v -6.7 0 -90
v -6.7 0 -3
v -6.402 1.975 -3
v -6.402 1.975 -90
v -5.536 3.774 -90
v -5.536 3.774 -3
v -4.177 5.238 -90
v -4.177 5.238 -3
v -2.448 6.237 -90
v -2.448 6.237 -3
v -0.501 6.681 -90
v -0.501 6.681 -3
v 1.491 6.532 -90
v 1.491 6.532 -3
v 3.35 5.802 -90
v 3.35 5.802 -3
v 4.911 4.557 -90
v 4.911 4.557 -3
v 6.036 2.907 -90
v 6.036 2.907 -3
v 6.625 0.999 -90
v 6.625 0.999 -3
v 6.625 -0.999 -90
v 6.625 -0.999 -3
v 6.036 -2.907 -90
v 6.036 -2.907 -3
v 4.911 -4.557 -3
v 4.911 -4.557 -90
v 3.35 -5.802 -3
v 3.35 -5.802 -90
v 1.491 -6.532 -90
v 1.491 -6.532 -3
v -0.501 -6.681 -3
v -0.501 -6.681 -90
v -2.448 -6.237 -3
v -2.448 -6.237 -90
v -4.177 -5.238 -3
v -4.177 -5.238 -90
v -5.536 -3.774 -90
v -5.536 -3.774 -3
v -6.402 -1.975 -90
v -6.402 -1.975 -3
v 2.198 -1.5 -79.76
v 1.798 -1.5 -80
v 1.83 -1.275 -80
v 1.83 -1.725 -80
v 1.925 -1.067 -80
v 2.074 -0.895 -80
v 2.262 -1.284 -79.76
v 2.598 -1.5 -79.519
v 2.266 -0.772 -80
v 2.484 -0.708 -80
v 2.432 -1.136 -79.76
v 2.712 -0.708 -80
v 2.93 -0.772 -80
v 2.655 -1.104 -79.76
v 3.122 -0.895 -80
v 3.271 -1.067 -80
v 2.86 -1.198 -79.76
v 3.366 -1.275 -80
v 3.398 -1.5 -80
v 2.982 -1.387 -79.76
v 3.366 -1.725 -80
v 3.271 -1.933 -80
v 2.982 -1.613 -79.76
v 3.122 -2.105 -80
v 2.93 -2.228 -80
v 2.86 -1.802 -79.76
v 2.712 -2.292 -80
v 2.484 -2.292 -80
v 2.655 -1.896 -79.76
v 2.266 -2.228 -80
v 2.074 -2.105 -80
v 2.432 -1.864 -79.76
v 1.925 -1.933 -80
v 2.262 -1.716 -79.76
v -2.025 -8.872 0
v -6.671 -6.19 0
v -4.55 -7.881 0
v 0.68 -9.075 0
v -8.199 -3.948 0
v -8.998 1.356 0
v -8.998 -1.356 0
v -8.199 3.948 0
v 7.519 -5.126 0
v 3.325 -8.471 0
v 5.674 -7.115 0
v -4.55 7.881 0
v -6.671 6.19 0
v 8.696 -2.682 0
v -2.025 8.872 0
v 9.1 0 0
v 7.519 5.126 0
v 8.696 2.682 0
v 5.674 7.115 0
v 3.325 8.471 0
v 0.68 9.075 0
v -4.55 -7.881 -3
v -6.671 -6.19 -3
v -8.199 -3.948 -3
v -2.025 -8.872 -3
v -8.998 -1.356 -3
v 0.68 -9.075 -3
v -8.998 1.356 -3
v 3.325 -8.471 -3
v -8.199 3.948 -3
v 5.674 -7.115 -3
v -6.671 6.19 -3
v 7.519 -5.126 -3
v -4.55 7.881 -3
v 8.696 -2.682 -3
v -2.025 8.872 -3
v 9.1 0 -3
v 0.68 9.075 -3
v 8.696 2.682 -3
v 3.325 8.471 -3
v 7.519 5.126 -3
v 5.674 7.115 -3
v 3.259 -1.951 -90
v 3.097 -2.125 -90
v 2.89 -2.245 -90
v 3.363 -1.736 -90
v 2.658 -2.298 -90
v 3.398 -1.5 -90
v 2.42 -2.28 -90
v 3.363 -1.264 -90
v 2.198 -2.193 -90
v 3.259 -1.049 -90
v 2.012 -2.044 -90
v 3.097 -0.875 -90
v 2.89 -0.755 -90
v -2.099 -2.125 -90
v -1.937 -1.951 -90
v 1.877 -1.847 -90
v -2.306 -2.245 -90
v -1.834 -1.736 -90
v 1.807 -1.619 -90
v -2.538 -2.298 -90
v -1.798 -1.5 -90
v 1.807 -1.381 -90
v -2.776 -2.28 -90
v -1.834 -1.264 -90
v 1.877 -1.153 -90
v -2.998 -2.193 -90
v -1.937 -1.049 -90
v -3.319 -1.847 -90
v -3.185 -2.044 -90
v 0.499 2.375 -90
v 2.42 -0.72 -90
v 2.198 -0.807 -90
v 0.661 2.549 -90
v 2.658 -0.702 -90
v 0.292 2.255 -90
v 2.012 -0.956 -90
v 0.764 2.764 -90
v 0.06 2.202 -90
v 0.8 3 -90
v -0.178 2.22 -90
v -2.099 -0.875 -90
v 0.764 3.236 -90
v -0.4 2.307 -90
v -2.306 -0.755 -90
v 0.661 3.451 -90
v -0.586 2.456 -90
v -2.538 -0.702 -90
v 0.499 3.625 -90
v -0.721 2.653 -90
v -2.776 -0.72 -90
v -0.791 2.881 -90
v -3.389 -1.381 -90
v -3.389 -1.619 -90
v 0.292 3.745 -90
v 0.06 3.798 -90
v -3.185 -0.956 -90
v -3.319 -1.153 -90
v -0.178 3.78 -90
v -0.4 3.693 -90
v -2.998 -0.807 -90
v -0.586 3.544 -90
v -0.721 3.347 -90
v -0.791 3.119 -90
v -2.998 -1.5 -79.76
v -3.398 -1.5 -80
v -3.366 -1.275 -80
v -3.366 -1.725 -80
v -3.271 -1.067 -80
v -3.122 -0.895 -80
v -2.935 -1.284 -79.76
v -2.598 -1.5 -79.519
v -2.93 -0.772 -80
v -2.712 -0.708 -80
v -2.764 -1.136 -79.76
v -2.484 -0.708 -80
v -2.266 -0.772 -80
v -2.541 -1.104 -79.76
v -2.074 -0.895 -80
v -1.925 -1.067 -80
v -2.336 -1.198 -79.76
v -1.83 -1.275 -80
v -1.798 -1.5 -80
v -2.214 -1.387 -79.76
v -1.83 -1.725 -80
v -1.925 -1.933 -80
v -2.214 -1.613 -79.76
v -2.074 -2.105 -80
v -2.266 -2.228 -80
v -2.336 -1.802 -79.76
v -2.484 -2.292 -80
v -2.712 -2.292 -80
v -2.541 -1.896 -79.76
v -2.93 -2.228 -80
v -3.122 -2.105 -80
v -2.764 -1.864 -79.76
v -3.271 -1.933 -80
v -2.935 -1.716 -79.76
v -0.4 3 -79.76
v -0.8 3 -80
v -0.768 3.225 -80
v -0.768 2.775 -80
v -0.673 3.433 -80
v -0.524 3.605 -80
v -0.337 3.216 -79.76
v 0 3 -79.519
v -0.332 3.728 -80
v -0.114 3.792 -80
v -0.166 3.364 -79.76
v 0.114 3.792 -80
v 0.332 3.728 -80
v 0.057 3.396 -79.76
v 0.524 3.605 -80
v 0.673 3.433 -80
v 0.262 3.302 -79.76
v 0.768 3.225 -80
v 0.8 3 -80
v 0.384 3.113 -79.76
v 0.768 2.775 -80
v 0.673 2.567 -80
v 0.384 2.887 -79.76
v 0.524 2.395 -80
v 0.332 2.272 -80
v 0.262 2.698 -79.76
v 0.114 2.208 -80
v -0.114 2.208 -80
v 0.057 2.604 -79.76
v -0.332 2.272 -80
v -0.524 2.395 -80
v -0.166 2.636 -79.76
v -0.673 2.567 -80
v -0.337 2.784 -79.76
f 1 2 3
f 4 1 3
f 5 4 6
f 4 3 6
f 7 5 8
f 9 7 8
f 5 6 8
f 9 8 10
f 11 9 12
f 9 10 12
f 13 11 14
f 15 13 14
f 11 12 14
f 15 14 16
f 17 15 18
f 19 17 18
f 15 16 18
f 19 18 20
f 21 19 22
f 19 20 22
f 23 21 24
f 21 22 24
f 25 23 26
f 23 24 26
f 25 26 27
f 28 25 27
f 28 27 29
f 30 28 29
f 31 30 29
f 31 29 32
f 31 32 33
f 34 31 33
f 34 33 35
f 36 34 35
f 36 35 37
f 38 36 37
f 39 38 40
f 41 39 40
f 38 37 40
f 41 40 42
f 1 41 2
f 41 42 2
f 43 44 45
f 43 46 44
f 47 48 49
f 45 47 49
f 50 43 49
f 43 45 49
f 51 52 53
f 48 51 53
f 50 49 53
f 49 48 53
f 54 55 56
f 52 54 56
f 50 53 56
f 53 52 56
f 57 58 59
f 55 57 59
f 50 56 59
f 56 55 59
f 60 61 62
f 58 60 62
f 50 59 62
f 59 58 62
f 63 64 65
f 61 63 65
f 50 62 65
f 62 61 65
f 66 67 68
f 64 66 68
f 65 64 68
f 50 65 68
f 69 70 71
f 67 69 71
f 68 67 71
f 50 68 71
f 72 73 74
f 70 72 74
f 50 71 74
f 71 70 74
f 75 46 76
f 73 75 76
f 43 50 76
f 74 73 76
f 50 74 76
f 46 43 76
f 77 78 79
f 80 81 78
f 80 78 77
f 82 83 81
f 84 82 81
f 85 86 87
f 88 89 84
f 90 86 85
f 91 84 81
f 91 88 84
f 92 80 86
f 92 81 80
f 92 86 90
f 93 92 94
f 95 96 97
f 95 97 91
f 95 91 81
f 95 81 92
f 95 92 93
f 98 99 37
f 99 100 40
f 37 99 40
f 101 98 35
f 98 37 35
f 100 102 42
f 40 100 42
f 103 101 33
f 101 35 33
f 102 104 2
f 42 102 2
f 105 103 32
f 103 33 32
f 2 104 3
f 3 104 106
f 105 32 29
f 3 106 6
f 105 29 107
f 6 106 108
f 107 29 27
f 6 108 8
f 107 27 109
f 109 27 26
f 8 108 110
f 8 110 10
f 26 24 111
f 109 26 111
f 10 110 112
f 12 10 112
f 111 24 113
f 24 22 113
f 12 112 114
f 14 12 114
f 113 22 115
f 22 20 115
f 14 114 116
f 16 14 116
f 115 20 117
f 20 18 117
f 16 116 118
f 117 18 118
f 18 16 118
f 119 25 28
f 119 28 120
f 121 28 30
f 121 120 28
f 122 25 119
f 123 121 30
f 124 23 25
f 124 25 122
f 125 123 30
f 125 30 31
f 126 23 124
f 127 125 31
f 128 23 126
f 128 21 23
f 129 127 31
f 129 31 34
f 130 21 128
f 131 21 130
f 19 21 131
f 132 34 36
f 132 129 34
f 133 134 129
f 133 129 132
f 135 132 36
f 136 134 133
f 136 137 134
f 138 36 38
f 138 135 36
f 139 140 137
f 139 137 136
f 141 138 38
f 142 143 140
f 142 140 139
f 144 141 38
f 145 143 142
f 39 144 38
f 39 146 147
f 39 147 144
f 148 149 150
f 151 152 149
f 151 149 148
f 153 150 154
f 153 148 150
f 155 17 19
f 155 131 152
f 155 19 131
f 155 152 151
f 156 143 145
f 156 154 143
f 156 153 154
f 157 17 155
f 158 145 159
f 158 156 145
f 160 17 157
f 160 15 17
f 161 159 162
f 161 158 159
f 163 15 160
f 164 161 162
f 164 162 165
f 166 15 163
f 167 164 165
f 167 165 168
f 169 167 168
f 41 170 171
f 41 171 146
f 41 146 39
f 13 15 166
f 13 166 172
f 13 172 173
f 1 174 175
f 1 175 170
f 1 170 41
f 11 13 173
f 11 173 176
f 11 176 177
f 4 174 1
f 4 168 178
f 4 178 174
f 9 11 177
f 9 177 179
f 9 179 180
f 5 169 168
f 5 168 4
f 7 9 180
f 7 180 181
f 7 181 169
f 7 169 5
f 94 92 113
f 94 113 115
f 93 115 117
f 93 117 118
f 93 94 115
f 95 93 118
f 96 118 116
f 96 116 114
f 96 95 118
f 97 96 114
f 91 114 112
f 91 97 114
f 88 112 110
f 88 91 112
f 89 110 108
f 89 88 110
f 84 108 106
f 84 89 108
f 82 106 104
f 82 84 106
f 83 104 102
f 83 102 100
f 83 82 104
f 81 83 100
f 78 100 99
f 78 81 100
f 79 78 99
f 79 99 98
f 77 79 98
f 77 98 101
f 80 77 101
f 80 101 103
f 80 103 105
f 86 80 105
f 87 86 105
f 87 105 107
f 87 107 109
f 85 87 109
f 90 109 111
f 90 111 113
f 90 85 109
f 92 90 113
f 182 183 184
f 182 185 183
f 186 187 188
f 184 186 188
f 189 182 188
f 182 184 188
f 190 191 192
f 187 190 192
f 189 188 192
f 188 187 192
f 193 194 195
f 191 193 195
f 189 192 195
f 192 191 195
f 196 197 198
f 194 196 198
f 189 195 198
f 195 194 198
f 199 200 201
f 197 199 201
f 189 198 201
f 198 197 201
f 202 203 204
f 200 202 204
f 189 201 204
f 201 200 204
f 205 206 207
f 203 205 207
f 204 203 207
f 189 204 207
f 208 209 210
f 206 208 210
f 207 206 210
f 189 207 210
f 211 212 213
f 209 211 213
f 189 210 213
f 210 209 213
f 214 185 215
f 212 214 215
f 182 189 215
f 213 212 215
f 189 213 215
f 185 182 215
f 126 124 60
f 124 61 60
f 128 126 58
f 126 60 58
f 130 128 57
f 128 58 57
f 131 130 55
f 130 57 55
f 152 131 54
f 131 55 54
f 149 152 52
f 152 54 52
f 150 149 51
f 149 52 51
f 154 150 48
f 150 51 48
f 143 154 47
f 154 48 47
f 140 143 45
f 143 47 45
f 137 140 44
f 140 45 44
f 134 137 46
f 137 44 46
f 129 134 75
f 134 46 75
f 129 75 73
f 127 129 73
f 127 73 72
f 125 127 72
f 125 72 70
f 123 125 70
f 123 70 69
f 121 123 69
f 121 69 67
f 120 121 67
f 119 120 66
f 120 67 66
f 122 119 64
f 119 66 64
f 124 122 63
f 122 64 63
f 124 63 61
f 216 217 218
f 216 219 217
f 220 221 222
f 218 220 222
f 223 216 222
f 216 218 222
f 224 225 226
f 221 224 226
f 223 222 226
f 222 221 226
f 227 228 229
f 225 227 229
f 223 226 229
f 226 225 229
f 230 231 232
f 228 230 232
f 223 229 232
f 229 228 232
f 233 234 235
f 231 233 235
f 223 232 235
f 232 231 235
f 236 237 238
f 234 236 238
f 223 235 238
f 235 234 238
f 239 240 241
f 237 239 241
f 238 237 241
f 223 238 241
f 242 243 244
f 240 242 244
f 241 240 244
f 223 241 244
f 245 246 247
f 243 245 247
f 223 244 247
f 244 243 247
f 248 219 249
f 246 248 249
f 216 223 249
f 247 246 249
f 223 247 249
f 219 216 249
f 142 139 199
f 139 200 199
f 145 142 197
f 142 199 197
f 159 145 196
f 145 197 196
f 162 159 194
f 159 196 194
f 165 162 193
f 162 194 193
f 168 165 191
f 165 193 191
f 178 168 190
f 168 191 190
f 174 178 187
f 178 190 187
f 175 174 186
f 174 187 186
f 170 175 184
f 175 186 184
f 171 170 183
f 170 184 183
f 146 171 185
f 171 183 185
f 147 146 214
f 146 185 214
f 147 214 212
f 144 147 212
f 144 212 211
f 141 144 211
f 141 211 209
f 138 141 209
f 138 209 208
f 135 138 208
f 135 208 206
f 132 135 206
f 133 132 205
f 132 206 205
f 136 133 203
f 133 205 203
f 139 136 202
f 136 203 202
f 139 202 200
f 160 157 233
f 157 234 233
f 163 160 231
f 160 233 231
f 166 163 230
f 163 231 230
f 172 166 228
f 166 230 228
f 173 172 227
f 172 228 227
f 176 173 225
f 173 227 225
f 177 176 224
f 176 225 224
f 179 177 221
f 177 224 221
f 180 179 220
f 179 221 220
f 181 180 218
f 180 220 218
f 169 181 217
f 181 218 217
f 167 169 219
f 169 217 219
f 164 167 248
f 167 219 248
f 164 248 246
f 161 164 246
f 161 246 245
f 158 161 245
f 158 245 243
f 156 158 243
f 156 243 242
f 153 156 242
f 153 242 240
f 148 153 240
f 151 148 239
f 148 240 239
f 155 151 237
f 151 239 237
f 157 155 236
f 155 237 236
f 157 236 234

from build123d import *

# Parameters (mm, degrees)
ESBO_O1_R                 = 9.1
RESSALTO_EXTRUS_O1_DEPTH  = 3
ESBO_O2_R                 = 6.7
RESSALTO_EXTRUS_O2_DEPTH  = 87
FURO_ROSCADO_DE_M21_D     = 1.6
FURO_ROSCADO_DE_M21_DEPTH = 10
FURO_ROSCADO_DE_M21_TIP   = 0.480688495


with BuildPart() as part:
    # Esboço1 → Ressalto-extrusão1 (new body)
    with BuildSketch(Plane.XY):
        Circle(ESBO_O1_R)
    extrude(amount=-RESSALTO_EXTRUS_O1_DEPTH)

    # Esboço2 → Ressalto-extrusão2 (add)
    with BuildSketch(Plane(origin=(0, 0, -3), x_dir=(-1, 0, 0), z_dir=(0, 0, -1))):
        Circle(ESBO_O2_R)
    extrude(amount=RESSALTO_EXTRUS_O2_DEPTH)

    # Furo roscado de M21
    with Locations(Plane(origin=(0, 0, -90), x_dir=(-1, 0, 0), z_dir=(0, 0, -1))):
        with Locations((-2.598076211, -1.5), (0, 3), (2.598076211, -1.5)):
            Hole(FURO_ROSCADO_DE_M21_D / 2, depth=FURO_ROSCADO_DE_M21_DEPTH)
            with Locations((0, 0, -(FURO_ROSCADO_DE_M21_DEPTH + FURO_ROSCADO_DE_M21_TIP / 2))):  # 118° drill point
                Cone(0, FURO_ROSCADO_DE_M21_D / 2, FURO_ROSCADO_DE_M21_TIP, mode=Mode.SUBTRACT)


solid = part.part
